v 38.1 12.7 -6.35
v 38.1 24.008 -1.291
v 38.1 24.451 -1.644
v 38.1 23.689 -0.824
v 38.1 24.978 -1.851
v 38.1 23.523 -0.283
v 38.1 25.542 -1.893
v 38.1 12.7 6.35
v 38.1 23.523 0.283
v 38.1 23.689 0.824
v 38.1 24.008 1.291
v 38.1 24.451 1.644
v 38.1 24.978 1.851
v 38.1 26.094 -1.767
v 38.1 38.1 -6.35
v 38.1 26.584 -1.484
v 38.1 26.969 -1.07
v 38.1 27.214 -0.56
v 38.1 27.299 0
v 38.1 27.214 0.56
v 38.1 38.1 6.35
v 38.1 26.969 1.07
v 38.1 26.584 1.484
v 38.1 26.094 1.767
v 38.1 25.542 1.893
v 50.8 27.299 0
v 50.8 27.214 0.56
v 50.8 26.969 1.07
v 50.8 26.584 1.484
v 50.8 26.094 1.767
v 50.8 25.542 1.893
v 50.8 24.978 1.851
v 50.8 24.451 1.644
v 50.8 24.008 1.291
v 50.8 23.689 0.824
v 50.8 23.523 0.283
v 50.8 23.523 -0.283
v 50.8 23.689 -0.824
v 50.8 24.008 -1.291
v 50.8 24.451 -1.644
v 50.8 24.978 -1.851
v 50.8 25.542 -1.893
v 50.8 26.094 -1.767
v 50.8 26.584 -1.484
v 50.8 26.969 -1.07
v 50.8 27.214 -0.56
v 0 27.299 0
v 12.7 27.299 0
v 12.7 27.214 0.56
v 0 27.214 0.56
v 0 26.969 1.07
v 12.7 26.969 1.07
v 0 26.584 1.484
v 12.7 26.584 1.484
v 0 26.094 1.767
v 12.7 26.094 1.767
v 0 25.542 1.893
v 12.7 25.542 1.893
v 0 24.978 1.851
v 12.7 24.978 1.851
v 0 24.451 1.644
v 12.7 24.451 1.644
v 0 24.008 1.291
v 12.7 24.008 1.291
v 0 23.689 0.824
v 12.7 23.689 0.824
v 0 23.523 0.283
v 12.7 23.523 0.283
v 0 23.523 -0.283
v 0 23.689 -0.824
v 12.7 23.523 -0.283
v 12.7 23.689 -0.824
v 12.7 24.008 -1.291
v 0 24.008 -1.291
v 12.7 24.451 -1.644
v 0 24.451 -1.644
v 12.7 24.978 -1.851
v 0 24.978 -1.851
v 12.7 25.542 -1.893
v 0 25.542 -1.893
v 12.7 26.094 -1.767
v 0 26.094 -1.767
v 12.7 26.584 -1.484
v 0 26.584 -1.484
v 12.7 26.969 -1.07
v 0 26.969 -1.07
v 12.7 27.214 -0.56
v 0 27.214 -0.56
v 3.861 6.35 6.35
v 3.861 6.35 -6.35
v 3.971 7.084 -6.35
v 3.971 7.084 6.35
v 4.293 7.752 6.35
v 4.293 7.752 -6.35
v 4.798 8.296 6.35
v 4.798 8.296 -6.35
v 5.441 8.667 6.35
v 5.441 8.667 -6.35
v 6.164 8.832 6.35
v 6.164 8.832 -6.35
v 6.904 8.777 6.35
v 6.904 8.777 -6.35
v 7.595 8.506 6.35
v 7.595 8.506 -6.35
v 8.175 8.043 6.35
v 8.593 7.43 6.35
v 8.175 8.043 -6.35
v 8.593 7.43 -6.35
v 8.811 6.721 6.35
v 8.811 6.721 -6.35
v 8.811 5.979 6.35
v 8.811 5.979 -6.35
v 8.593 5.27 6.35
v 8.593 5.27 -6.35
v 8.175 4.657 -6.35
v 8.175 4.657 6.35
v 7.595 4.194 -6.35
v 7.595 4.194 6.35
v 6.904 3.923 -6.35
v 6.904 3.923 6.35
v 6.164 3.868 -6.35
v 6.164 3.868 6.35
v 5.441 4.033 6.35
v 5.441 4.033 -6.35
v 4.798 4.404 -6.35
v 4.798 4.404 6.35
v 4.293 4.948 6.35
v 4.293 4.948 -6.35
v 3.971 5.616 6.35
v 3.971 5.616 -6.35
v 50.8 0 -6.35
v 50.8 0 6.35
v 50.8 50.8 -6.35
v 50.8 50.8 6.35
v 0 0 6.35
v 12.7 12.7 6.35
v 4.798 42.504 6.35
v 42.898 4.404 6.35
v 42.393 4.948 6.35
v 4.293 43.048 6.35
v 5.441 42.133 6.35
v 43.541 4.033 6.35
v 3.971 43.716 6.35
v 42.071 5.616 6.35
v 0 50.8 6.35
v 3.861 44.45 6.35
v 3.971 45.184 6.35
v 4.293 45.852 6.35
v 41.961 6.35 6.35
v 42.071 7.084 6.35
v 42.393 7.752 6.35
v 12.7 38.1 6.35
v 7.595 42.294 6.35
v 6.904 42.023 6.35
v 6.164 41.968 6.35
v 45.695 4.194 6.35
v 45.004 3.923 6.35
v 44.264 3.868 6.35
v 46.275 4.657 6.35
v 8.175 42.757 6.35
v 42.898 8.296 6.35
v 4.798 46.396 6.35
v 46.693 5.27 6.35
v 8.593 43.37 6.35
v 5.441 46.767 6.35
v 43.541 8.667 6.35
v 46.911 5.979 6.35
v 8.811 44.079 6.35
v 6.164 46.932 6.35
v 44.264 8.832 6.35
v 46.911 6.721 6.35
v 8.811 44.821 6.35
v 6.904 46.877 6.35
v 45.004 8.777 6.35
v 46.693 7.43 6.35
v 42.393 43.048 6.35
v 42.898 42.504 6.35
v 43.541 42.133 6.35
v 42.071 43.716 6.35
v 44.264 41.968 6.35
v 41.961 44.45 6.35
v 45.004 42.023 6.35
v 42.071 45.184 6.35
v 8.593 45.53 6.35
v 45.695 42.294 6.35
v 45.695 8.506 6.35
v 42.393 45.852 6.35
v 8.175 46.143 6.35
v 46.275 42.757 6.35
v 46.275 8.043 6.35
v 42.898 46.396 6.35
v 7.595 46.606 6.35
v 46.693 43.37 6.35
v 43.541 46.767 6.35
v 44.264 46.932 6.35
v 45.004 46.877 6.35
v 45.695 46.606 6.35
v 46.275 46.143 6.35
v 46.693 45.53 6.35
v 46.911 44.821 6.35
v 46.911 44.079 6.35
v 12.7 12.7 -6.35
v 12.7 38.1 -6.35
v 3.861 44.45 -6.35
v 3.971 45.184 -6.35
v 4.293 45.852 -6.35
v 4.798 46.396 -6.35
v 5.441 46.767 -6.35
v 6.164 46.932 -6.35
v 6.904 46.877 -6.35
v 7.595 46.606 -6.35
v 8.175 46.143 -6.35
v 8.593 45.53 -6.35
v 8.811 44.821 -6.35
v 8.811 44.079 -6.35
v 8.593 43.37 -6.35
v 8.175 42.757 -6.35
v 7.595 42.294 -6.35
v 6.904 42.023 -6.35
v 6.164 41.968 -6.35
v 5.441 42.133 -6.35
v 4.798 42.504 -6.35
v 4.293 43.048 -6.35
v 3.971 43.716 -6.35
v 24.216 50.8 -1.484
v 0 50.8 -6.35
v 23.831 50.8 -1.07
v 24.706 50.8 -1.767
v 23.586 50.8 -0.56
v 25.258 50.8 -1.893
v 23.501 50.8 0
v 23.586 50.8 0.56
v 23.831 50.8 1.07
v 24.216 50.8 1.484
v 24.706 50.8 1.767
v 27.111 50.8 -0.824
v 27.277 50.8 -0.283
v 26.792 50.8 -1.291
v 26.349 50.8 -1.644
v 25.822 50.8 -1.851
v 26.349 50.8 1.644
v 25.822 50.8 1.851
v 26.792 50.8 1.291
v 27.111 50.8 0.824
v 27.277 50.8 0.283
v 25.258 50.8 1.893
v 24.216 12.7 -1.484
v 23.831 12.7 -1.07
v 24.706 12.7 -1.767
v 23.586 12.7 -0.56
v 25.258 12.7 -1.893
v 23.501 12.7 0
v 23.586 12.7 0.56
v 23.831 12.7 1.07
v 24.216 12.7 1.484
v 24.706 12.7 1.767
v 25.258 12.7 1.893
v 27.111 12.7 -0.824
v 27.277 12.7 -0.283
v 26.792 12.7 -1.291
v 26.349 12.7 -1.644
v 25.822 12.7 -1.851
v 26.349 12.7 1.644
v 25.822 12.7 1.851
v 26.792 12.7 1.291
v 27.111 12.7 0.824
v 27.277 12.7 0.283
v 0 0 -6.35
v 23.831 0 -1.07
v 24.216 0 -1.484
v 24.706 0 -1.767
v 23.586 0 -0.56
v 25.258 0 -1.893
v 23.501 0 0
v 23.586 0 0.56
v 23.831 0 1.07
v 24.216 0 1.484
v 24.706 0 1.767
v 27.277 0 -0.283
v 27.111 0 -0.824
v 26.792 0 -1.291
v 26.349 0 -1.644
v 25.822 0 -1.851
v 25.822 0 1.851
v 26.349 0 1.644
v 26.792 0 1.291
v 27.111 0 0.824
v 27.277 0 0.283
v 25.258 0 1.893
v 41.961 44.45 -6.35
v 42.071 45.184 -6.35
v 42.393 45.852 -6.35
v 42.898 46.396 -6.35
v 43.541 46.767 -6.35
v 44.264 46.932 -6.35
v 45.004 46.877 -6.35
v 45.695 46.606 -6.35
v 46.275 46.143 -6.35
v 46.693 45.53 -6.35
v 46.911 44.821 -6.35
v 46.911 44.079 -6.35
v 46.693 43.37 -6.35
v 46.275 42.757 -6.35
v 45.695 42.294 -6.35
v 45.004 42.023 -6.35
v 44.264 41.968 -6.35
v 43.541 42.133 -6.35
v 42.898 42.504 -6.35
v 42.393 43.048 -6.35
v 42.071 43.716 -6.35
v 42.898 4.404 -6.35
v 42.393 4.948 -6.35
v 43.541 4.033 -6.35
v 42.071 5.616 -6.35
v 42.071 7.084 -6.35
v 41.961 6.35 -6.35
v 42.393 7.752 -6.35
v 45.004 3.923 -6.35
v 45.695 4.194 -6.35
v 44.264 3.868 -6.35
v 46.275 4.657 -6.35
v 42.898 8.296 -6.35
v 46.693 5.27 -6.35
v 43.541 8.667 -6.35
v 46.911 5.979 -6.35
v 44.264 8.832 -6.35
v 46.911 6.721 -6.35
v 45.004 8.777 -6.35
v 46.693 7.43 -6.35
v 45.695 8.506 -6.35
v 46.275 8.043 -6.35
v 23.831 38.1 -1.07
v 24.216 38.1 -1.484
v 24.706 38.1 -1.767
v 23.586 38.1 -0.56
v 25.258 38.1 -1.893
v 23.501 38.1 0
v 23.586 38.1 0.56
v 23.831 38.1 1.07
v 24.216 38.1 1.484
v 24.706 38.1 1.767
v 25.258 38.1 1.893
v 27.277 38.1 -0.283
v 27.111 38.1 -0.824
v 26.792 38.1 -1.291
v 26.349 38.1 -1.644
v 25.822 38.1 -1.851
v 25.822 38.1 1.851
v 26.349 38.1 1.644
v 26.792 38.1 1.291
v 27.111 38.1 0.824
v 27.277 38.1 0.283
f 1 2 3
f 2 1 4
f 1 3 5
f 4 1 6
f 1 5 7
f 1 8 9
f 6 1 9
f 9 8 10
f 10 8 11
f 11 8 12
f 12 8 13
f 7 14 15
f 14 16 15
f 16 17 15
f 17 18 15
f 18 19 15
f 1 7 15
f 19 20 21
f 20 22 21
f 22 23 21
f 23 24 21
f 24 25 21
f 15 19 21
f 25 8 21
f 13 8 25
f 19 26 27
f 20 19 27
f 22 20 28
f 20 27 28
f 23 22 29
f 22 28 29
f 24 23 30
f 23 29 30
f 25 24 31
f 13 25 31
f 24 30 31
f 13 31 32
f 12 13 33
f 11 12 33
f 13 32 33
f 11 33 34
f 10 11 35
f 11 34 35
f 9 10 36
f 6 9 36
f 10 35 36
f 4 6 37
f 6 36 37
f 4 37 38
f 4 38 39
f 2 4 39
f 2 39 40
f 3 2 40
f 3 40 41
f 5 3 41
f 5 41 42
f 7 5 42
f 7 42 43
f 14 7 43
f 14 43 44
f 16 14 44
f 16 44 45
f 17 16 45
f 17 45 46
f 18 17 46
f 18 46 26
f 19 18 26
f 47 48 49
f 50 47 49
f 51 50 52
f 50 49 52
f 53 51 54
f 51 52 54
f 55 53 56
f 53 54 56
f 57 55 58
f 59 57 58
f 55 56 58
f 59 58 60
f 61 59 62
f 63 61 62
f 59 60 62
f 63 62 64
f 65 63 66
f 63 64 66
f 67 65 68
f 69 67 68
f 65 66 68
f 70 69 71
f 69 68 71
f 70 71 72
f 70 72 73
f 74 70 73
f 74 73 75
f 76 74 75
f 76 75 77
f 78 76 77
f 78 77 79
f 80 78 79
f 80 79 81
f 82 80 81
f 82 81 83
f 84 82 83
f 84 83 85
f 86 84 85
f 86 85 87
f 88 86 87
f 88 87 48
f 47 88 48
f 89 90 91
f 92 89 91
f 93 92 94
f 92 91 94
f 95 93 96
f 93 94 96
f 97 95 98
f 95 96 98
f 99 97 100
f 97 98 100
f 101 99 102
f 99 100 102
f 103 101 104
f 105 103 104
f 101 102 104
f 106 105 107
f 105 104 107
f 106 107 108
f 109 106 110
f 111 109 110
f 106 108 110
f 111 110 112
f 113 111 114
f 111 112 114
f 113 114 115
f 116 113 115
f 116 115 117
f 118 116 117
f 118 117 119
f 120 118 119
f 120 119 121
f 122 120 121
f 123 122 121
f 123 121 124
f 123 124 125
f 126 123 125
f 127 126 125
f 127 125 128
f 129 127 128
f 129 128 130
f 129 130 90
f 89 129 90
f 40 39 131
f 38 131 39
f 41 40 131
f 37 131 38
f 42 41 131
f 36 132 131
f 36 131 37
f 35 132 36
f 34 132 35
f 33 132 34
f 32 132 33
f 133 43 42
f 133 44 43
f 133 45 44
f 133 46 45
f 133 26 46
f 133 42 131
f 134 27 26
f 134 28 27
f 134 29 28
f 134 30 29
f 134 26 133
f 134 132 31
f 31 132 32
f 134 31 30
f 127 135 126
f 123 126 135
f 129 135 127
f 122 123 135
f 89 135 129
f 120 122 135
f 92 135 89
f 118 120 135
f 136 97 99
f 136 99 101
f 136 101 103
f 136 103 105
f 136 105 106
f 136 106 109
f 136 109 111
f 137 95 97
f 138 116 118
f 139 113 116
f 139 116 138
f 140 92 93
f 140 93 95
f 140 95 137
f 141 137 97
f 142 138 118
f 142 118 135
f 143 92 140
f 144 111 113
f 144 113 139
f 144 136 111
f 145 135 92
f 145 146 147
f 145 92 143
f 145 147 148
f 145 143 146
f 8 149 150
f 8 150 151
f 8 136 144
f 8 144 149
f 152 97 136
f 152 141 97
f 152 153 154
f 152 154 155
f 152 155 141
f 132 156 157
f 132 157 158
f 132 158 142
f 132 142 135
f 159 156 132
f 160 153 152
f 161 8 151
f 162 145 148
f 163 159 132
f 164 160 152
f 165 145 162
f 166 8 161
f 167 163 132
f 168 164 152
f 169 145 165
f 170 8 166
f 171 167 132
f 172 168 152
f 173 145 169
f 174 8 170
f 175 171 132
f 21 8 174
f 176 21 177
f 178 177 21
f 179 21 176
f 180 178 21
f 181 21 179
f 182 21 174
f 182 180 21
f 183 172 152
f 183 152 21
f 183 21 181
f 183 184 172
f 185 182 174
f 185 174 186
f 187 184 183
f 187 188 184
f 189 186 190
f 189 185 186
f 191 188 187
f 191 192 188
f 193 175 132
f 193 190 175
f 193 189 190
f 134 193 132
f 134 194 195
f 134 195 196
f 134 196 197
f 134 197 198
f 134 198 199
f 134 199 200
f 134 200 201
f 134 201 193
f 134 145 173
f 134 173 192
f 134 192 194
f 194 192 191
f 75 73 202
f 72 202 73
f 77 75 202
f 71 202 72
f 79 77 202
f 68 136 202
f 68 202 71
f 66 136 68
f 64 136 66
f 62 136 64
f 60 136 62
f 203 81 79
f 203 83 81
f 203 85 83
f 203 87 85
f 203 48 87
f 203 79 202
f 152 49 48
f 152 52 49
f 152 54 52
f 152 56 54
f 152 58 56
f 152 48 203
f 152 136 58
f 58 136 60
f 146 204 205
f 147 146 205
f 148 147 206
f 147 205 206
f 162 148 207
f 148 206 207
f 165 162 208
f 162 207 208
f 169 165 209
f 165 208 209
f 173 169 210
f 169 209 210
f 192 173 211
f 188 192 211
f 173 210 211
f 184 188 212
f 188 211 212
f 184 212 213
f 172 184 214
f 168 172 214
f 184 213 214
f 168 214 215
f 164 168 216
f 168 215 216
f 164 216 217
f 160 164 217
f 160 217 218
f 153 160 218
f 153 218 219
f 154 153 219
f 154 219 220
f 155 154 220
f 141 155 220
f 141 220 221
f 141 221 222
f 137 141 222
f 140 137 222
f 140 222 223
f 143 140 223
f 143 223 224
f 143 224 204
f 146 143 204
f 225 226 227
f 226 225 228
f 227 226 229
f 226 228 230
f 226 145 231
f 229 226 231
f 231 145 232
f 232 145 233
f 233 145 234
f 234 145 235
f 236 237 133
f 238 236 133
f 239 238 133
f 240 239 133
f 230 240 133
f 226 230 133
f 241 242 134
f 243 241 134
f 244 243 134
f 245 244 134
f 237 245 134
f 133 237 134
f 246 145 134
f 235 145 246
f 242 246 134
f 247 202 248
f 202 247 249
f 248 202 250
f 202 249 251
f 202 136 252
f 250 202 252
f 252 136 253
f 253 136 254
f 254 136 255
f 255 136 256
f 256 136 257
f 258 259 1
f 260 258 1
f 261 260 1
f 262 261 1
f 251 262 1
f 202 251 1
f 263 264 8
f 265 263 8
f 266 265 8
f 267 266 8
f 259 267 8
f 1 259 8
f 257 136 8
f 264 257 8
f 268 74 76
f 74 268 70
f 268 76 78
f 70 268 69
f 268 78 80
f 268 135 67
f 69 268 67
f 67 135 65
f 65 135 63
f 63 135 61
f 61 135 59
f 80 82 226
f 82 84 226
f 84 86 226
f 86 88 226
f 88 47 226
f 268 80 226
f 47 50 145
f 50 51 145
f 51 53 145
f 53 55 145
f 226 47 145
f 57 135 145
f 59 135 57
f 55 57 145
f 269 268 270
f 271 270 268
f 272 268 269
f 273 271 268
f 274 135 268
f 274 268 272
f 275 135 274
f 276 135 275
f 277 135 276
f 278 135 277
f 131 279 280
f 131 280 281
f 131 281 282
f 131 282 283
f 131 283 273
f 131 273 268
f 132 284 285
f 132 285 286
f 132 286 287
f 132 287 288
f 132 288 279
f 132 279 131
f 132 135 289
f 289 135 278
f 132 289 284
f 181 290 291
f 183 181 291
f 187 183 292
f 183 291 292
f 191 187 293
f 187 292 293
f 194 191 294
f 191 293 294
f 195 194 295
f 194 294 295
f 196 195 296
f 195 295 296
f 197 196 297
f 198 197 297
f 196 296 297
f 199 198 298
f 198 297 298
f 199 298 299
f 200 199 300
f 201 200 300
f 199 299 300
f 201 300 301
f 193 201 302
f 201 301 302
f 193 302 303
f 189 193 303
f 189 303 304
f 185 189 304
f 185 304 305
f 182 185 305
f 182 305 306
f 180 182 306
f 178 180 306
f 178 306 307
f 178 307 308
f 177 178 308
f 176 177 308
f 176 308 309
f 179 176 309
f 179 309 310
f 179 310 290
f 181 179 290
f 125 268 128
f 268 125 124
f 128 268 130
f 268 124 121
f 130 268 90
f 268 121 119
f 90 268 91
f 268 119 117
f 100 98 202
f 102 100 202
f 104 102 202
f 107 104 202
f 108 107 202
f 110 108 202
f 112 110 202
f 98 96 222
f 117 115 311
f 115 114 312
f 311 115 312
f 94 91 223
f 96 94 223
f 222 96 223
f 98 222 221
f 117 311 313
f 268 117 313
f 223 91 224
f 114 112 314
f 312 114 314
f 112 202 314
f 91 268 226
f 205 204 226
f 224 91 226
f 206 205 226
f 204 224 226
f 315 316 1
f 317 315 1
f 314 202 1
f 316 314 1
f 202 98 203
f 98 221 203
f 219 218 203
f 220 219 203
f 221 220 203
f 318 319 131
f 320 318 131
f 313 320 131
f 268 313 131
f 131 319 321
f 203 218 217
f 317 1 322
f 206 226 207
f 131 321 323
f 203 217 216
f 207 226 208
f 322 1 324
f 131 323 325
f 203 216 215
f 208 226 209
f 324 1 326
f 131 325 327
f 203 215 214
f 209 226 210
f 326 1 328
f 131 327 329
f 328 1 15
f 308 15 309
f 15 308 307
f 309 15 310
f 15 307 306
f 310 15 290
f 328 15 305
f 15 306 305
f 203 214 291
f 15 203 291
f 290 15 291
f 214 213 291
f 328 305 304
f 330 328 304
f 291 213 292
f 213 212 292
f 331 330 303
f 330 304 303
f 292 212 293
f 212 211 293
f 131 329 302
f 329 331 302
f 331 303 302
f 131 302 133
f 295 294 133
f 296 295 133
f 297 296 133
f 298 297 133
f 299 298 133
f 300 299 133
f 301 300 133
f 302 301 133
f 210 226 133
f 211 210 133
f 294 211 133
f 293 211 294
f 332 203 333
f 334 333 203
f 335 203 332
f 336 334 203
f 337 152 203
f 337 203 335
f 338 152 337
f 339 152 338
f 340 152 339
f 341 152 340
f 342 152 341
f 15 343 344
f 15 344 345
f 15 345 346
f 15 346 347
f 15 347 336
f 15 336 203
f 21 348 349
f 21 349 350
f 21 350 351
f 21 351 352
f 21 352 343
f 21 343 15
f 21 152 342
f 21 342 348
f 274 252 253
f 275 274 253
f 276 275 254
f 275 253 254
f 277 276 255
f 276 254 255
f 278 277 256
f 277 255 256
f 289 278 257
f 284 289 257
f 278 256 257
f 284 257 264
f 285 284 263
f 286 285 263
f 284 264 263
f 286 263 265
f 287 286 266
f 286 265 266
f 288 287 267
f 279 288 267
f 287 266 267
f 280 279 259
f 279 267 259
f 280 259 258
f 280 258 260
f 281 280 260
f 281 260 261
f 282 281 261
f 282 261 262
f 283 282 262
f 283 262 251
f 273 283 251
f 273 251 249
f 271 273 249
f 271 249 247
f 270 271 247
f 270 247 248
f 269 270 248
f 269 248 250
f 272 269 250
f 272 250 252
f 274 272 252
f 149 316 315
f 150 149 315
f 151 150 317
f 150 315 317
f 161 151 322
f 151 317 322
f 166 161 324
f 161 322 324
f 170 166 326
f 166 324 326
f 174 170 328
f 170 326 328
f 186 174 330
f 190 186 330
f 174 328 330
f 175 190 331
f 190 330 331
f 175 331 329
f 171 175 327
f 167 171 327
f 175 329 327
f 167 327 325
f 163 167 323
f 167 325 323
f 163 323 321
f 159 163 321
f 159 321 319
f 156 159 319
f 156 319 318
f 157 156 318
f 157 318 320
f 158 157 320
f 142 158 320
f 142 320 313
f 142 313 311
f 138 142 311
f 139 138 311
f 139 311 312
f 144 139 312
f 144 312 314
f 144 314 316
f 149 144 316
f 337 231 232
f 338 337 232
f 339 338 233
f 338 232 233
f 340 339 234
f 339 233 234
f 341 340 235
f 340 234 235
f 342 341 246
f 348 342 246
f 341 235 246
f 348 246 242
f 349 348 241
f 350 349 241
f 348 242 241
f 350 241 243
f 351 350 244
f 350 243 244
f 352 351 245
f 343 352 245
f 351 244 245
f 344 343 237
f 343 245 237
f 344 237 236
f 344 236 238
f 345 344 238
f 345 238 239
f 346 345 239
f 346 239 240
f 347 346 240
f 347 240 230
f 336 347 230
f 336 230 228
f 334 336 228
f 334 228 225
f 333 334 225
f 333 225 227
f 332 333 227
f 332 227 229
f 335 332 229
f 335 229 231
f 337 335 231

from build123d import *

# Parameters (mm, degrees)
F0_W          = 50.8
F0_H          = 50.8
F1_DEPTH      = 6.35
F1_DEPTH_BACK = 6.35
F2_W          = 25.4
F2_H          = 25.4
F3_DEPTH      = 113.7438993901
F4_D          = 4.9784
F7_D          = 3.7973
F7_ON_F5_D    = 3.7973


with BuildPart() as f1:
    # F0 (on Top) → F1 (new body, two sides)
    with BuildSketch(Plane.XY) as f1_sk:
        with Locations((25.4, 25.4)):
            Rectangle(F0_W, F0_H)
    extrude(amount=F1_DEPTH)
    extrude(f1_sk.sketch, amount=-F1_DEPTH_BACK)

    # F2 (on face) → F3 (cut)
    with BuildSketch(Plane.XY.offset(6.35)):
        with Locations((25.4, 25.4)):
            Rectangle(F2_W, F2_H)
    extrude(amount=-F3_DEPTH, mode=Mode.SUBTRACT)

    # F4 (through all)
    with Locations(Plane.XY.offset(6.35)):
        with Locations((44.45, 44.45), (6.35, 44.45), (6.35, 6.35), (44.45, 6.35)):
            Hole(F4_D / 2)

    # F7 (through all)
    with Locations(Plane.XZ):
        with Locations((25.4, 0)):
            Hole(F7_D / 2)

    # F7 on F5 (through all)
    with Locations(Plane(origin=(0, 0, 0), x_dir=(0, -1, 0), z_dir=(-1, 0, 0))):
        with Locations((-25.4, 0)):
            Hole(F7_ON_F5_D / 2)


solid = f1.part
